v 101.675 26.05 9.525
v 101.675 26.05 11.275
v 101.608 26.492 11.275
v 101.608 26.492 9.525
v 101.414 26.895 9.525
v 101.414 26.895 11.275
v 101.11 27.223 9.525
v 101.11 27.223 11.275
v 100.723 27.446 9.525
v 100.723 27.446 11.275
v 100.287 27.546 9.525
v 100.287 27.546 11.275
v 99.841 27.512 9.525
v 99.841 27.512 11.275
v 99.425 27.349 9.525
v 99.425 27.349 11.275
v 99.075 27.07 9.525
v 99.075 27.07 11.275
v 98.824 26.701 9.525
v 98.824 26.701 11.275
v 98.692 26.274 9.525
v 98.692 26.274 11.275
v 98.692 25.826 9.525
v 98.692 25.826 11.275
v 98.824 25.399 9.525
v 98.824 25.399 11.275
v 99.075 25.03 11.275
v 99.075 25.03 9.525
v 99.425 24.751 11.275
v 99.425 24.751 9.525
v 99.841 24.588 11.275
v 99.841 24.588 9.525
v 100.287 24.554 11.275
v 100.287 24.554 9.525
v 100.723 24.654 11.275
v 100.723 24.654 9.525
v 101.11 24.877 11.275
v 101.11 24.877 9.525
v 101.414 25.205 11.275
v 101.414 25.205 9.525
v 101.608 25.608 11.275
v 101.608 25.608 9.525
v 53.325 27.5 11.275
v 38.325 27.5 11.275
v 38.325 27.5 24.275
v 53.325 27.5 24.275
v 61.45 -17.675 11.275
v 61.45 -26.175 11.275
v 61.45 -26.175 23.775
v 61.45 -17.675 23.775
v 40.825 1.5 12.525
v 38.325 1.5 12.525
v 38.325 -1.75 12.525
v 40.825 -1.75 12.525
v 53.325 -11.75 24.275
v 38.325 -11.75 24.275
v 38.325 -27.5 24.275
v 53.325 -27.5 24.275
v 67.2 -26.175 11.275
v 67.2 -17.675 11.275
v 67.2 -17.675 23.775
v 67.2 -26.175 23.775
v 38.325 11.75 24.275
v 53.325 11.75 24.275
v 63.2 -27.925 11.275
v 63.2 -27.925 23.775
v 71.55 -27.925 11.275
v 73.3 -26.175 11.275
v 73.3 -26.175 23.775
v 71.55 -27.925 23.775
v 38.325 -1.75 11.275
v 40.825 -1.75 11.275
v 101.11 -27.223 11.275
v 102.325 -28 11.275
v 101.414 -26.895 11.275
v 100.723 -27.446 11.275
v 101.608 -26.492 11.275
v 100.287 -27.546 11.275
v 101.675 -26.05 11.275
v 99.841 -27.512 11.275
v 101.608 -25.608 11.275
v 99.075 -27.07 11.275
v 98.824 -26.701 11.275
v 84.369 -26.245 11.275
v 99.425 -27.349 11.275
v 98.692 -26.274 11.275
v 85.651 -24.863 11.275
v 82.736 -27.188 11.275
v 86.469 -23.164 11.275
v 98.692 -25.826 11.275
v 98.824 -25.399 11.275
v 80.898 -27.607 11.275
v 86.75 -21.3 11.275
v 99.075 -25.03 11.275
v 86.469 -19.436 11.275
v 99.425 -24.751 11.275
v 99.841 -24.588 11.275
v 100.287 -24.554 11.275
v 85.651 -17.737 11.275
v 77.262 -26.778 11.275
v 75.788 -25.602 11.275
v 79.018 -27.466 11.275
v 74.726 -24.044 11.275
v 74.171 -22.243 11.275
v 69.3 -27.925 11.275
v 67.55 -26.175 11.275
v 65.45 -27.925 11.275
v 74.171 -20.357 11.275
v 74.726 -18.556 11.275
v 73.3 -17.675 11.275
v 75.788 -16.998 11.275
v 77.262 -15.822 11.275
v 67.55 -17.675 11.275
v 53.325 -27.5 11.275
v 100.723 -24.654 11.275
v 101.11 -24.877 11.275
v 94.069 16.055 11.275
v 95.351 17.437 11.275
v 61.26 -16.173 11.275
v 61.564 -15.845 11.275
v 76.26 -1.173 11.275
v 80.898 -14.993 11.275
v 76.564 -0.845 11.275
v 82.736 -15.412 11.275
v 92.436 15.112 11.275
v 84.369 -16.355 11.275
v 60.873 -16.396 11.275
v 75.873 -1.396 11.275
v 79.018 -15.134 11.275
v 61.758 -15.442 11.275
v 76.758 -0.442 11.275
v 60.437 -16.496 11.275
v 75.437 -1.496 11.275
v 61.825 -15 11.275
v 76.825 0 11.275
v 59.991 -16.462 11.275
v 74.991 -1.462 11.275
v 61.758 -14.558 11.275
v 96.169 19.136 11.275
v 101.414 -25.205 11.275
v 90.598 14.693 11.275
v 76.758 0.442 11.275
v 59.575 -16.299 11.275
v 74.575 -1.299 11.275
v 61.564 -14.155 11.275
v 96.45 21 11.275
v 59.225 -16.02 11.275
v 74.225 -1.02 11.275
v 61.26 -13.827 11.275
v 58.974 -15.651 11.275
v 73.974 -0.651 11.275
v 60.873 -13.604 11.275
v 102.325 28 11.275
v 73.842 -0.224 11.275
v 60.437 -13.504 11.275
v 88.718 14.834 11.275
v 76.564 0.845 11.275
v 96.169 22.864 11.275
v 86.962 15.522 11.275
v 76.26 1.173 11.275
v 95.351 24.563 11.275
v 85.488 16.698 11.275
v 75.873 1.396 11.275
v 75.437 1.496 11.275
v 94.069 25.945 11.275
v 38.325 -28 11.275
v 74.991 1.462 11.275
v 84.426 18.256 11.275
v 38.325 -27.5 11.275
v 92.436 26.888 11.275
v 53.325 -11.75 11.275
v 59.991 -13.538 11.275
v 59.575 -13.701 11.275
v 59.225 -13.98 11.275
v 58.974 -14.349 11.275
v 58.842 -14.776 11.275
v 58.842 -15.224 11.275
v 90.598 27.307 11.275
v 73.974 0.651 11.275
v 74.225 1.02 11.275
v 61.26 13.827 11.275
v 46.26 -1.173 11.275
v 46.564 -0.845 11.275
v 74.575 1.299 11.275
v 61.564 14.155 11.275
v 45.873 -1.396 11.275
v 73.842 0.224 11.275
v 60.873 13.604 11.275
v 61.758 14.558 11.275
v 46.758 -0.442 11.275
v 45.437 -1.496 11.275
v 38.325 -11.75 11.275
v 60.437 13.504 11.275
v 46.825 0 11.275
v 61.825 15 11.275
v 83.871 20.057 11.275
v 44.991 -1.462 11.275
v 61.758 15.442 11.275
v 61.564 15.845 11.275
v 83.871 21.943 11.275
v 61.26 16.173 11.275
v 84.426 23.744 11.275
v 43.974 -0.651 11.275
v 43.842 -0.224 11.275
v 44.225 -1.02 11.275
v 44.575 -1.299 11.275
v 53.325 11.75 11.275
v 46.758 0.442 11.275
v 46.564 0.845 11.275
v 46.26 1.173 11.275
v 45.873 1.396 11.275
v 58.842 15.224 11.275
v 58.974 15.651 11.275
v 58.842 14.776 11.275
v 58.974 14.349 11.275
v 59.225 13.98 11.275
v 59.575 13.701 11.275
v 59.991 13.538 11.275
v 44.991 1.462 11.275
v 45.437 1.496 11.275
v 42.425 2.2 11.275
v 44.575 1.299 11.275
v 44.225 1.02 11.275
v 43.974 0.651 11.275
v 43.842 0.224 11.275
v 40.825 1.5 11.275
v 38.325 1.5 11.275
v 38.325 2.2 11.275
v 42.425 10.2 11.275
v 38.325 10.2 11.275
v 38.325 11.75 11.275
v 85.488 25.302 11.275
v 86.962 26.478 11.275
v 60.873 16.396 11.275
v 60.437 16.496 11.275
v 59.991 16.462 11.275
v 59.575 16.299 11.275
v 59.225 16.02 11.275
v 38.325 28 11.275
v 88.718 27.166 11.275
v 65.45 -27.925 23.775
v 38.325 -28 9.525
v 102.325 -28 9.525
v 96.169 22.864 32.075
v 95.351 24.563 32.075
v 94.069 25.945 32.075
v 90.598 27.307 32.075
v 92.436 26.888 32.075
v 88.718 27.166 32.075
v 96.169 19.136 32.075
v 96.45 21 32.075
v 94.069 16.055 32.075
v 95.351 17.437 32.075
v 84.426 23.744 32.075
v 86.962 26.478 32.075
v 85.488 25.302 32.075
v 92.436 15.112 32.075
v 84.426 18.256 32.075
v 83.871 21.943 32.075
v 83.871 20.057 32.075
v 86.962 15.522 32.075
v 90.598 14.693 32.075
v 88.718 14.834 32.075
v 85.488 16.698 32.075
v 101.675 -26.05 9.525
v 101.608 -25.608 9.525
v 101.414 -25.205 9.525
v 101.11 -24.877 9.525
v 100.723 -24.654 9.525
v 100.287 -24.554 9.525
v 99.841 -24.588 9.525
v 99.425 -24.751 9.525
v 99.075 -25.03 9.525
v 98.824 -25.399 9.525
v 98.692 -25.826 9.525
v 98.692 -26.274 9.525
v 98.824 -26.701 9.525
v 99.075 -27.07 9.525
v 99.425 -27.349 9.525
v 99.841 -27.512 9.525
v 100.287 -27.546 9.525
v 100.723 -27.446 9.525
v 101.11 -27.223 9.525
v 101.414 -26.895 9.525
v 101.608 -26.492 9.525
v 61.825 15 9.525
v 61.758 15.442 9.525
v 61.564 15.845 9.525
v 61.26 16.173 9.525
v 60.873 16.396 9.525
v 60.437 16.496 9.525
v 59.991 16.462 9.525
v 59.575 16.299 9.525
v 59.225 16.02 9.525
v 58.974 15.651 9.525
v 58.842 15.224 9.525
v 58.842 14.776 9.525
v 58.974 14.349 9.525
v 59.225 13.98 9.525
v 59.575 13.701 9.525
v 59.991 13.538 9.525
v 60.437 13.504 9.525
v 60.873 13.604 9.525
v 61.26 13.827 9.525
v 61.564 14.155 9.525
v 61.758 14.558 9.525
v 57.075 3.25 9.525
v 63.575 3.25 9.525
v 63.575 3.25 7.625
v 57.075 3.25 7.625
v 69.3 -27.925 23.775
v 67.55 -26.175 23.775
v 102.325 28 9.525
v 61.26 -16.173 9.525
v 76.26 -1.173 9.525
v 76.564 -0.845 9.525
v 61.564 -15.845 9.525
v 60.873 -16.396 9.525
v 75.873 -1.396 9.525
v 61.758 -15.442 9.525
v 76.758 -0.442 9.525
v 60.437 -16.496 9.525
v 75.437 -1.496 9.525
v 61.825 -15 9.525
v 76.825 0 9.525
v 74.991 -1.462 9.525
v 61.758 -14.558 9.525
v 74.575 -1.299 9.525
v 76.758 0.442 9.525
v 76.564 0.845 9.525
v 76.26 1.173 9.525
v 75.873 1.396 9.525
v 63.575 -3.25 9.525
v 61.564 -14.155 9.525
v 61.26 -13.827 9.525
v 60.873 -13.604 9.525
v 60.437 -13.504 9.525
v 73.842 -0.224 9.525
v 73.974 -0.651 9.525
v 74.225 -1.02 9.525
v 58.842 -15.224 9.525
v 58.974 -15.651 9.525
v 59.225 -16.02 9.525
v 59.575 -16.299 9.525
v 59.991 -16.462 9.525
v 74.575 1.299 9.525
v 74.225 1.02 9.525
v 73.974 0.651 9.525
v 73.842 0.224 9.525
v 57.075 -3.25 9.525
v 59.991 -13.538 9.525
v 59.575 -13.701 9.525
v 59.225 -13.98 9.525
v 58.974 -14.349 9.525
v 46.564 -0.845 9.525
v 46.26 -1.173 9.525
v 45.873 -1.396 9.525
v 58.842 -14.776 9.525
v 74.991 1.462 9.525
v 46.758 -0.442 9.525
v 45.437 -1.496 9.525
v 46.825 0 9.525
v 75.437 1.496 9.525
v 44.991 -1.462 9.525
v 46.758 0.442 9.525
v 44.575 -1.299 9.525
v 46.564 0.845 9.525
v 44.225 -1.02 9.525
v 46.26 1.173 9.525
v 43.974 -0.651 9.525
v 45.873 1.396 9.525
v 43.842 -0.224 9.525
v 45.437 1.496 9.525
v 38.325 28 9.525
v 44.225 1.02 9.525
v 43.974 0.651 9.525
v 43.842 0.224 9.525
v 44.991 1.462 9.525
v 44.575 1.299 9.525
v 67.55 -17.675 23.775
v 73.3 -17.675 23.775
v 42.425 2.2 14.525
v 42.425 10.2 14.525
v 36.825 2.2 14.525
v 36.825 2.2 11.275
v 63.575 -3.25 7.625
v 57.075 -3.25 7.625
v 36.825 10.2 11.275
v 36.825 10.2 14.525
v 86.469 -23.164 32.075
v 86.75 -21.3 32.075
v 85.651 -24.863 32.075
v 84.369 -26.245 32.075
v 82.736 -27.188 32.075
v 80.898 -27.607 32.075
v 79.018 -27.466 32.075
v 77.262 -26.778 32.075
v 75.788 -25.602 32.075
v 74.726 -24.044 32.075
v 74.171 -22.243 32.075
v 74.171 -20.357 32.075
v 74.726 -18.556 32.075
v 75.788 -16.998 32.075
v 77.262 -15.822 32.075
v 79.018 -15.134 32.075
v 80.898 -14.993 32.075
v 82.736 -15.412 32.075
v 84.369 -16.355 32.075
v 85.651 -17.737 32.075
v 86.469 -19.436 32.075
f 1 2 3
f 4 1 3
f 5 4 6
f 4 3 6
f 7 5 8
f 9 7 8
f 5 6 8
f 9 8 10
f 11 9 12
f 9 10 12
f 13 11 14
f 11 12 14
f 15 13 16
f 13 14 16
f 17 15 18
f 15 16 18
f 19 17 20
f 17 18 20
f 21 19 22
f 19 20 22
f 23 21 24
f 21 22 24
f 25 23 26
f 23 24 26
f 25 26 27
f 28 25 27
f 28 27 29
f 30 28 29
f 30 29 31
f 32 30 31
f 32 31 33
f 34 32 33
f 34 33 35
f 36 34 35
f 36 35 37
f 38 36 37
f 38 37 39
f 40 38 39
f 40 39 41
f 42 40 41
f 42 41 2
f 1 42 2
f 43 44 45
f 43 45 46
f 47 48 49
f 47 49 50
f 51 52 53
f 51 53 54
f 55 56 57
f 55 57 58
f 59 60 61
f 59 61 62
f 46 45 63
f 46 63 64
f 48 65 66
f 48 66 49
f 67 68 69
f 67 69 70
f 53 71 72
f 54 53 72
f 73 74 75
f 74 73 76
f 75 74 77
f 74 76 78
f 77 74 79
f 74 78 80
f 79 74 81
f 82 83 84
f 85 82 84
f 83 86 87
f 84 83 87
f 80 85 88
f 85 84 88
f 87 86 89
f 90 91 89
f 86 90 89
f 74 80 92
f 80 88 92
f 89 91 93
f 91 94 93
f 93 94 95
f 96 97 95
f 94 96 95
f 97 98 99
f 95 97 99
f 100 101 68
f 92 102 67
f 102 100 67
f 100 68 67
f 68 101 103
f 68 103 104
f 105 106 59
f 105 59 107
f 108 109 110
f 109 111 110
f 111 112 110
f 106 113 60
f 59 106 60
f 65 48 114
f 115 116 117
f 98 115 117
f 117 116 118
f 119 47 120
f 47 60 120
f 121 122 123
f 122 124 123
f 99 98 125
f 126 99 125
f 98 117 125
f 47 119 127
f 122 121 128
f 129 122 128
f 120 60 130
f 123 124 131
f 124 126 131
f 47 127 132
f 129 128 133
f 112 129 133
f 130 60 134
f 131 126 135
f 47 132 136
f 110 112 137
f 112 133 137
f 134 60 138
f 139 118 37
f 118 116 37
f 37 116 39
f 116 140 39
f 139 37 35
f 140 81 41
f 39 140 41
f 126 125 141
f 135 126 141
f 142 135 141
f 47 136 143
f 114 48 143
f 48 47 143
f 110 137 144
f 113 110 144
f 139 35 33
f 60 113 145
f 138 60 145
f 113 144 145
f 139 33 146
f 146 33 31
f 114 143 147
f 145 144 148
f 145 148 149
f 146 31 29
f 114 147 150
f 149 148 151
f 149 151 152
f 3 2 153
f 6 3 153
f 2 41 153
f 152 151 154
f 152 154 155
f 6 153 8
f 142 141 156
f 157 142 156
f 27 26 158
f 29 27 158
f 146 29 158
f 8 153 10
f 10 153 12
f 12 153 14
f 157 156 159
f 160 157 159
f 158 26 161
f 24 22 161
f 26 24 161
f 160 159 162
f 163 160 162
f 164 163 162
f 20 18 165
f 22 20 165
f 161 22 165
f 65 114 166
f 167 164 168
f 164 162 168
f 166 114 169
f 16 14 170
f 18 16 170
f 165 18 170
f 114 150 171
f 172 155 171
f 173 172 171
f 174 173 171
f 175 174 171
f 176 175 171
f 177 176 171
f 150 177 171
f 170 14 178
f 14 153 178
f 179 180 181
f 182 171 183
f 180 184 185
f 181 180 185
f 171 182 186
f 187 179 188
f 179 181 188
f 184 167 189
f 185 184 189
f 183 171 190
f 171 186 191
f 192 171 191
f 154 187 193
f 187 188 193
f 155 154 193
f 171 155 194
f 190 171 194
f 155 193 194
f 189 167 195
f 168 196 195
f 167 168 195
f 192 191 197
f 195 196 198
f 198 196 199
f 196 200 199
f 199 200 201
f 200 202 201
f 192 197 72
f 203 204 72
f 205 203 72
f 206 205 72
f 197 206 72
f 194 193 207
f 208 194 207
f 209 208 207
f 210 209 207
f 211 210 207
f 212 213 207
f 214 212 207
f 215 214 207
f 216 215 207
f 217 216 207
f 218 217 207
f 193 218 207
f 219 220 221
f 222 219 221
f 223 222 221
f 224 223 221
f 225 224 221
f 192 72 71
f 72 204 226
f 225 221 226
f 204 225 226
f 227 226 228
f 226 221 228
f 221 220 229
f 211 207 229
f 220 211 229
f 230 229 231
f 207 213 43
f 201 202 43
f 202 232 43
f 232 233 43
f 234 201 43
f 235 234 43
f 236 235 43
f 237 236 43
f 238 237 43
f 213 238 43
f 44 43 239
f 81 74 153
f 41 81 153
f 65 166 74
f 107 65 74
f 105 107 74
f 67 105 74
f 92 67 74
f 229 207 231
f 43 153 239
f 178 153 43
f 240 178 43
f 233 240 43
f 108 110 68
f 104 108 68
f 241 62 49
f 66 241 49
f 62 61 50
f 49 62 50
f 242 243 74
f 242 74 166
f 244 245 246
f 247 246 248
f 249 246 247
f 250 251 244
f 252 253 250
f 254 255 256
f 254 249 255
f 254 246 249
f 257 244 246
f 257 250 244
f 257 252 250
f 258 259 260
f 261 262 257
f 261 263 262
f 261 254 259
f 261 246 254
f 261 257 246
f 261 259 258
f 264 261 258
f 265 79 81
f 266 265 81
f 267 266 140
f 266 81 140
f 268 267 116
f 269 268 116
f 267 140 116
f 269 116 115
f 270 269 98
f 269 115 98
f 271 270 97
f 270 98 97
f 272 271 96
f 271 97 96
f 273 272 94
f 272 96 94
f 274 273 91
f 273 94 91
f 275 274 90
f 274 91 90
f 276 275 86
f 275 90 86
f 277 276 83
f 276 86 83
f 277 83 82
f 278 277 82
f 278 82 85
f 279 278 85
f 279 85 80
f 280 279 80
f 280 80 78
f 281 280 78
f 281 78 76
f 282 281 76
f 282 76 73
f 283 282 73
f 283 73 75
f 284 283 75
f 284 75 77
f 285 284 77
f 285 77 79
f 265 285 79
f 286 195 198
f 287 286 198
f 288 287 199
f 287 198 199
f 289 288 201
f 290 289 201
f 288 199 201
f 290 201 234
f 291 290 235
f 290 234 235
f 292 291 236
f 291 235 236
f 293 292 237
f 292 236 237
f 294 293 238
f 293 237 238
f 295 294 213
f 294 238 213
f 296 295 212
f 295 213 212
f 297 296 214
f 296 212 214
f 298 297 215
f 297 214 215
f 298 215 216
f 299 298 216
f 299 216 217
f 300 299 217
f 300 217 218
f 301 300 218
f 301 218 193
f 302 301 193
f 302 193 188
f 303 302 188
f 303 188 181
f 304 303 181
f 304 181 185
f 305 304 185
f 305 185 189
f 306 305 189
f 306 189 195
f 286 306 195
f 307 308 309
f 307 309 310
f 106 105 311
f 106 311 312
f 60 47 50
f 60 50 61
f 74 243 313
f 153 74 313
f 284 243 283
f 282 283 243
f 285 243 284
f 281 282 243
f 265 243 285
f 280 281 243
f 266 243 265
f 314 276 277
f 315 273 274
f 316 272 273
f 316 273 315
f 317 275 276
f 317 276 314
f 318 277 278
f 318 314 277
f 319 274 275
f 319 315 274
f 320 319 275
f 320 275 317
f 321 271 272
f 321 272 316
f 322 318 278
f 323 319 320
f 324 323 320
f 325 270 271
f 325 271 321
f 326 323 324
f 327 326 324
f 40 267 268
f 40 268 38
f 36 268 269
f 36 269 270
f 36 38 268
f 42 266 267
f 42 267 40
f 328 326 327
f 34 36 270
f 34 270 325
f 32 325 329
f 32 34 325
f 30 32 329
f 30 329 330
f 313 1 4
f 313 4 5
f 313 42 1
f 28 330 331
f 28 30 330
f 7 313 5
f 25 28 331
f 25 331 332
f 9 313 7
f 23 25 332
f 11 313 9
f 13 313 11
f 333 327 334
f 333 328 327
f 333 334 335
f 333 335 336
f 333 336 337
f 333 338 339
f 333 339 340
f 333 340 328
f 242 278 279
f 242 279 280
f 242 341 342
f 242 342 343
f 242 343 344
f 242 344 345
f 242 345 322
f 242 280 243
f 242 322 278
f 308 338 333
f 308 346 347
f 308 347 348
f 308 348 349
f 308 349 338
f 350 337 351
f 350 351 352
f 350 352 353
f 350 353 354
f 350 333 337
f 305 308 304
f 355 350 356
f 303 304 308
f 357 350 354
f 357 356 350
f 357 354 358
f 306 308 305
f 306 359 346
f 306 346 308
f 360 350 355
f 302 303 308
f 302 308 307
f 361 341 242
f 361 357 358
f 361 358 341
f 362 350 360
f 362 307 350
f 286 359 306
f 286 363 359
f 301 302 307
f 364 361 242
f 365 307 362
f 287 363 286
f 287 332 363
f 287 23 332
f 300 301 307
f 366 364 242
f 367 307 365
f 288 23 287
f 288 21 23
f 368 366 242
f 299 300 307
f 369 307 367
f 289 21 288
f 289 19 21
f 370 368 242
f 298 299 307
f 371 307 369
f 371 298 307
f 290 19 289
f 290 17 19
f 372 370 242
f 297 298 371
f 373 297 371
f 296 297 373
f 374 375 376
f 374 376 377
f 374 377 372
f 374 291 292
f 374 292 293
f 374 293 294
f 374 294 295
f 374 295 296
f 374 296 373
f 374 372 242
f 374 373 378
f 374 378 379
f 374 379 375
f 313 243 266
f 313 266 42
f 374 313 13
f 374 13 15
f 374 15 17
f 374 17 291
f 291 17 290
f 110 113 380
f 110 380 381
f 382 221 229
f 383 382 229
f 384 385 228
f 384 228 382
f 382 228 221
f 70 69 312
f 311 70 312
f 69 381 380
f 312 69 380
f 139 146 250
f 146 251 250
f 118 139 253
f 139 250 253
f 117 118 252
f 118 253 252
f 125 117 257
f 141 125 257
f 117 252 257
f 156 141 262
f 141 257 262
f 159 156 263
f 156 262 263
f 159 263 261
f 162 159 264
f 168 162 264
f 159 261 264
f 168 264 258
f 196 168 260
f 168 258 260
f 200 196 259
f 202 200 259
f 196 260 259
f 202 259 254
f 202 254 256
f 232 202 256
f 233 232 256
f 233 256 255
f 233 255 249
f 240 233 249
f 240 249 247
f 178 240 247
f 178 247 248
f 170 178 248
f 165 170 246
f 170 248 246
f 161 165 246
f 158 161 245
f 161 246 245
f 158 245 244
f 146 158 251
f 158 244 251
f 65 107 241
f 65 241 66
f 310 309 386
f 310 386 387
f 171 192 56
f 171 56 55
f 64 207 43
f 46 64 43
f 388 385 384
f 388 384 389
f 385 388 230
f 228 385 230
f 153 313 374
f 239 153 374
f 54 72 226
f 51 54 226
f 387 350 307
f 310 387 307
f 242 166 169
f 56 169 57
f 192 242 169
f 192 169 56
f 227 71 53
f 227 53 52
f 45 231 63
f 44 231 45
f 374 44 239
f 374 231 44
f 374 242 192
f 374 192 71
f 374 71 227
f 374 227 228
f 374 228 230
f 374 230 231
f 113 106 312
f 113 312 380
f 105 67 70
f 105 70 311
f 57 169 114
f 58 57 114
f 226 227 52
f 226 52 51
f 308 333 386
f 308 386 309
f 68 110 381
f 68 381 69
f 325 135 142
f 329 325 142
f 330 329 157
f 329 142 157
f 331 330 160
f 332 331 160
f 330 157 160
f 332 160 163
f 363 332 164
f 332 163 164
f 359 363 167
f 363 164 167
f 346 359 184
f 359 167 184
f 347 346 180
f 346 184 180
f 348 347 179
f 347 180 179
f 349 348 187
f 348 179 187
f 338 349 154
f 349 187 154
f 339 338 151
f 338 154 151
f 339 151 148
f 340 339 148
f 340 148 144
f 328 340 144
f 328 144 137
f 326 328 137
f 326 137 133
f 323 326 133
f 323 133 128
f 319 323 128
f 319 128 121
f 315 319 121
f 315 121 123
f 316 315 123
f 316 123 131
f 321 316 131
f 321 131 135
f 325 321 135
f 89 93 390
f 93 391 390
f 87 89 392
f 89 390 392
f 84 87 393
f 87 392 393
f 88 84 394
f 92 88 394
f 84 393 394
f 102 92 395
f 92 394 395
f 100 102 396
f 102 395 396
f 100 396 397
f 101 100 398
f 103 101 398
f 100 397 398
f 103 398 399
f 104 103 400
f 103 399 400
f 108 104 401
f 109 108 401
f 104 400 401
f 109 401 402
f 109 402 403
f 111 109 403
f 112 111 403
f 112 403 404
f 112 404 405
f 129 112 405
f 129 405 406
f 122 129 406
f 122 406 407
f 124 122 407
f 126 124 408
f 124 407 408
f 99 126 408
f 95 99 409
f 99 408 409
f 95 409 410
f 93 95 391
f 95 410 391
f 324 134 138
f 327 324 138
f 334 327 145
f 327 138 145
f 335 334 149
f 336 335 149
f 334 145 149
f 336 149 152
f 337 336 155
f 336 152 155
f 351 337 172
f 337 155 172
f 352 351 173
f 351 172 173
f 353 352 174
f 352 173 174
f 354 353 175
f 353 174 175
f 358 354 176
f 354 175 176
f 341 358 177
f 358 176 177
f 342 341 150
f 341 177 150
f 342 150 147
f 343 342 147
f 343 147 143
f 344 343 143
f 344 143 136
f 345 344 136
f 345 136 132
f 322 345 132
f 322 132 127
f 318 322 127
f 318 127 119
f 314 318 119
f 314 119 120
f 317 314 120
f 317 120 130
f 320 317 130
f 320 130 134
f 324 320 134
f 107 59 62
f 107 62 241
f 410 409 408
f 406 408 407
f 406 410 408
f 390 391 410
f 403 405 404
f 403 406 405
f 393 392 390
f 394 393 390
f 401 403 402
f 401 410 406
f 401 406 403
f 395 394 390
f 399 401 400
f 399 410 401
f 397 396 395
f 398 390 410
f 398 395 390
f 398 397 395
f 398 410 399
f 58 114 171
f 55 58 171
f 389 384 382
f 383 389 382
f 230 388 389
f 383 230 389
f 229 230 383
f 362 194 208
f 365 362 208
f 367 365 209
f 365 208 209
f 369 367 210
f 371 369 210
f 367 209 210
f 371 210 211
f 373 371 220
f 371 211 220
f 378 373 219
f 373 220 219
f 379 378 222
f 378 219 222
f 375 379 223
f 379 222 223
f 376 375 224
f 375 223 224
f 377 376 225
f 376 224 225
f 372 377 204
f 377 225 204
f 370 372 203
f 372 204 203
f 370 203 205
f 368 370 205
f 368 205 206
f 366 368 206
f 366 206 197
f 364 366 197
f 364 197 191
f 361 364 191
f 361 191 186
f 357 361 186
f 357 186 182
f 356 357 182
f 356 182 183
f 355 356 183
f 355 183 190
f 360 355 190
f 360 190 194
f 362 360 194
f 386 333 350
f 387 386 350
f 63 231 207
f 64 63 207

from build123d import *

# Parameters (mm, degrees)
SKETCH1_W                 = 64
SKETCH1_H                 = 56
BOSS_EXTRUDE1_DEPTH       = 1.75
SKETCH2_W                 = 5.6
SKETCH2_H                 = 8
BOSS_EXTRUDE2_DEPTH       = 3.249999999
BOSS_EXTRUDE3_DEPTH       = 12.5
SKETCH4_W                 = 2.5
SKETCH4_H                 = 3.249999996
BOSS_EXTRUDE4_DEPTH       = 1.250000001
SKETCH5_W                 = 15
SKETCH5_H                 = 15.750000006
BOSS_EXTRUDE5_DEPTH       = 12.999999998
SKETCH6_W                 = 15
SKETCH6_H                 = 15.749999994
BOSS_EXTRUDE6_DEPTH       = 13
BOSS_EXTRUDE7_DEPTH       = 12.5
SKETCH8_W                 = 6.5
SKETCH8_H                 = 6.499999992
BOSS_EXTRUDE8_DEPTH       = 1.9
SKETCH9_W                 = 6.325
SKETCH9_H                 = 20.8
SKETCH10_W                = 6.325
SKETCH10_H                = 20.8
F_3_CLEARANCE_HOLE1_D     = 3
F_3_CLEARANCE_HOLE1_DEPTH = 22.55


with BuildPart() as part:
    # Sketch1 → Boss-Extrude1 (new body)
    with BuildSketch(Plane(origin=(0, 0, 9.525), x_dir=(-1, 0, 0), z_dir=(0, 0, -1))):
        with Locations((-70.325, 0)):
            Rectangle(SKETCH1_W, SKETCH1_H)
    extrude(amount=-BOSS_EXTRUDE1_DEPTH)

    # Sketch2 → Boss-Extrude2 (add)
    with BuildSketch(Plane.XY.offset(11.275)):
        with Locations((39.625, 6.2)):
            Rectangle(SKETCH2_W, SKETCH2_H)
    extrude(amount=BOSS_EXTRUDE2_DEPTH)

    # Sketch3 → Boss-Extrude3 (add)
    with BuildSketch(Plane.XY.offset(11.275)):
        Polygon((61.45, -17.675), (67.199999996, -17.675), (67.199999996, -26.174999992), (65.449999996, -27.924999992), (63.2, -27.924999992), (61.45, -26.174999992), align=None)
    extrude(amount=BOSS_EXTRUDE3_DEPTH)

    # Sketch4 → Boss-Extrude4 (add)
    with BuildSketch(Plane.XY.offset(11.275)):
        with Locations((39.575, -0.125000002)):
            Rectangle(SKETCH4_W, SKETCH4_H)
    extrude(amount=BOSS_EXTRUDE4_DEPTH)

    # Sketch5 → Boss-Extrude5 (add)
    with BuildSketch(Plane.XY.offset(11.275)):
        with Locations((45.825, -19.625000009)):
            Rectangle(SKETCH5_W, SKETCH5_H)
    extrude(amount=BOSS_EXTRUDE5_DEPTH)

    # Sketch6 → Boss-Extrude6 (add)
    with BuildSketch(Plane.XY.offset(11.275)):
        with Locations((45.825, 19.625000009)):
            Rectangle(SKETCH6_W, SKETCH6_H)
    extrude(amount=BOSS_EXTRUDE6_DEPTH)

    # Sketch7 → Boss-Extrude7 (add)
    with BuildSketch(Plane.XY.offset(11.275)):
        Polygon((67.55, -17.675), (73.299999996, -17.675), (73.299999996, -26.174999992), (71.549999996, -27.924999992), (69.3, -27.924999992), (67.55, -26.174999992), align=None)
    extrude(amount=BOSS_EXTRUDE7_DEPTH)

    # Sketch8 → Boss-Extrude8 (add)
    with BuildSketch(Plane(origin=(0, 0, 9.525), x_dir=(-1, 0, 0), z_dir=(0, 0, -1))):
        with Locations((-60.325, 0)):
            Rectangle(SKETCH8_W, SKETCH8_H)
    extrude(amount=BOSS_EXTRUDE8_DEPTH)

    # Sketch9 → Revolve1 (revolve)
    with BuildSketch(Plane.XZ.offset(21.3)):
        with Locations((83.5875, 21.675)):
            Rectangle(SKETCH9_W, SKETCH9_H)
    revolve(axis=Axis((80.425, -21.3, 32.075), (0, 0, -1)))

    # Sketch10 → Revolve2 (revolve)
    with BuildSketch(Plane.XZ.offset(-21)):
        with Locations((93.2875, 21.675)):
            Rectangle(SKETCH10_W, SKETCH10_H)
    revolve(axis=Axis((90.125, 21, 32.075), (0, 0, -1)))

    # #3 Clearance Hole1
    with Locations(Plane(origin=(0, 0, 9.525), x_dir=(-1, 0, 0), z_dir=(0, 0, -1))):
        with Locations((-45.325, 0), (-60.325, 15), (-75.325, 0), (-60.325, -15), (-100.175, 26.05), (-100.175, -26.05)):
            Hole(F_3_CLEARANCE_HOLE1_D / 2, depth=F_3_CLEARANCE_HOLE1_DEPTH)


solid = part.part
